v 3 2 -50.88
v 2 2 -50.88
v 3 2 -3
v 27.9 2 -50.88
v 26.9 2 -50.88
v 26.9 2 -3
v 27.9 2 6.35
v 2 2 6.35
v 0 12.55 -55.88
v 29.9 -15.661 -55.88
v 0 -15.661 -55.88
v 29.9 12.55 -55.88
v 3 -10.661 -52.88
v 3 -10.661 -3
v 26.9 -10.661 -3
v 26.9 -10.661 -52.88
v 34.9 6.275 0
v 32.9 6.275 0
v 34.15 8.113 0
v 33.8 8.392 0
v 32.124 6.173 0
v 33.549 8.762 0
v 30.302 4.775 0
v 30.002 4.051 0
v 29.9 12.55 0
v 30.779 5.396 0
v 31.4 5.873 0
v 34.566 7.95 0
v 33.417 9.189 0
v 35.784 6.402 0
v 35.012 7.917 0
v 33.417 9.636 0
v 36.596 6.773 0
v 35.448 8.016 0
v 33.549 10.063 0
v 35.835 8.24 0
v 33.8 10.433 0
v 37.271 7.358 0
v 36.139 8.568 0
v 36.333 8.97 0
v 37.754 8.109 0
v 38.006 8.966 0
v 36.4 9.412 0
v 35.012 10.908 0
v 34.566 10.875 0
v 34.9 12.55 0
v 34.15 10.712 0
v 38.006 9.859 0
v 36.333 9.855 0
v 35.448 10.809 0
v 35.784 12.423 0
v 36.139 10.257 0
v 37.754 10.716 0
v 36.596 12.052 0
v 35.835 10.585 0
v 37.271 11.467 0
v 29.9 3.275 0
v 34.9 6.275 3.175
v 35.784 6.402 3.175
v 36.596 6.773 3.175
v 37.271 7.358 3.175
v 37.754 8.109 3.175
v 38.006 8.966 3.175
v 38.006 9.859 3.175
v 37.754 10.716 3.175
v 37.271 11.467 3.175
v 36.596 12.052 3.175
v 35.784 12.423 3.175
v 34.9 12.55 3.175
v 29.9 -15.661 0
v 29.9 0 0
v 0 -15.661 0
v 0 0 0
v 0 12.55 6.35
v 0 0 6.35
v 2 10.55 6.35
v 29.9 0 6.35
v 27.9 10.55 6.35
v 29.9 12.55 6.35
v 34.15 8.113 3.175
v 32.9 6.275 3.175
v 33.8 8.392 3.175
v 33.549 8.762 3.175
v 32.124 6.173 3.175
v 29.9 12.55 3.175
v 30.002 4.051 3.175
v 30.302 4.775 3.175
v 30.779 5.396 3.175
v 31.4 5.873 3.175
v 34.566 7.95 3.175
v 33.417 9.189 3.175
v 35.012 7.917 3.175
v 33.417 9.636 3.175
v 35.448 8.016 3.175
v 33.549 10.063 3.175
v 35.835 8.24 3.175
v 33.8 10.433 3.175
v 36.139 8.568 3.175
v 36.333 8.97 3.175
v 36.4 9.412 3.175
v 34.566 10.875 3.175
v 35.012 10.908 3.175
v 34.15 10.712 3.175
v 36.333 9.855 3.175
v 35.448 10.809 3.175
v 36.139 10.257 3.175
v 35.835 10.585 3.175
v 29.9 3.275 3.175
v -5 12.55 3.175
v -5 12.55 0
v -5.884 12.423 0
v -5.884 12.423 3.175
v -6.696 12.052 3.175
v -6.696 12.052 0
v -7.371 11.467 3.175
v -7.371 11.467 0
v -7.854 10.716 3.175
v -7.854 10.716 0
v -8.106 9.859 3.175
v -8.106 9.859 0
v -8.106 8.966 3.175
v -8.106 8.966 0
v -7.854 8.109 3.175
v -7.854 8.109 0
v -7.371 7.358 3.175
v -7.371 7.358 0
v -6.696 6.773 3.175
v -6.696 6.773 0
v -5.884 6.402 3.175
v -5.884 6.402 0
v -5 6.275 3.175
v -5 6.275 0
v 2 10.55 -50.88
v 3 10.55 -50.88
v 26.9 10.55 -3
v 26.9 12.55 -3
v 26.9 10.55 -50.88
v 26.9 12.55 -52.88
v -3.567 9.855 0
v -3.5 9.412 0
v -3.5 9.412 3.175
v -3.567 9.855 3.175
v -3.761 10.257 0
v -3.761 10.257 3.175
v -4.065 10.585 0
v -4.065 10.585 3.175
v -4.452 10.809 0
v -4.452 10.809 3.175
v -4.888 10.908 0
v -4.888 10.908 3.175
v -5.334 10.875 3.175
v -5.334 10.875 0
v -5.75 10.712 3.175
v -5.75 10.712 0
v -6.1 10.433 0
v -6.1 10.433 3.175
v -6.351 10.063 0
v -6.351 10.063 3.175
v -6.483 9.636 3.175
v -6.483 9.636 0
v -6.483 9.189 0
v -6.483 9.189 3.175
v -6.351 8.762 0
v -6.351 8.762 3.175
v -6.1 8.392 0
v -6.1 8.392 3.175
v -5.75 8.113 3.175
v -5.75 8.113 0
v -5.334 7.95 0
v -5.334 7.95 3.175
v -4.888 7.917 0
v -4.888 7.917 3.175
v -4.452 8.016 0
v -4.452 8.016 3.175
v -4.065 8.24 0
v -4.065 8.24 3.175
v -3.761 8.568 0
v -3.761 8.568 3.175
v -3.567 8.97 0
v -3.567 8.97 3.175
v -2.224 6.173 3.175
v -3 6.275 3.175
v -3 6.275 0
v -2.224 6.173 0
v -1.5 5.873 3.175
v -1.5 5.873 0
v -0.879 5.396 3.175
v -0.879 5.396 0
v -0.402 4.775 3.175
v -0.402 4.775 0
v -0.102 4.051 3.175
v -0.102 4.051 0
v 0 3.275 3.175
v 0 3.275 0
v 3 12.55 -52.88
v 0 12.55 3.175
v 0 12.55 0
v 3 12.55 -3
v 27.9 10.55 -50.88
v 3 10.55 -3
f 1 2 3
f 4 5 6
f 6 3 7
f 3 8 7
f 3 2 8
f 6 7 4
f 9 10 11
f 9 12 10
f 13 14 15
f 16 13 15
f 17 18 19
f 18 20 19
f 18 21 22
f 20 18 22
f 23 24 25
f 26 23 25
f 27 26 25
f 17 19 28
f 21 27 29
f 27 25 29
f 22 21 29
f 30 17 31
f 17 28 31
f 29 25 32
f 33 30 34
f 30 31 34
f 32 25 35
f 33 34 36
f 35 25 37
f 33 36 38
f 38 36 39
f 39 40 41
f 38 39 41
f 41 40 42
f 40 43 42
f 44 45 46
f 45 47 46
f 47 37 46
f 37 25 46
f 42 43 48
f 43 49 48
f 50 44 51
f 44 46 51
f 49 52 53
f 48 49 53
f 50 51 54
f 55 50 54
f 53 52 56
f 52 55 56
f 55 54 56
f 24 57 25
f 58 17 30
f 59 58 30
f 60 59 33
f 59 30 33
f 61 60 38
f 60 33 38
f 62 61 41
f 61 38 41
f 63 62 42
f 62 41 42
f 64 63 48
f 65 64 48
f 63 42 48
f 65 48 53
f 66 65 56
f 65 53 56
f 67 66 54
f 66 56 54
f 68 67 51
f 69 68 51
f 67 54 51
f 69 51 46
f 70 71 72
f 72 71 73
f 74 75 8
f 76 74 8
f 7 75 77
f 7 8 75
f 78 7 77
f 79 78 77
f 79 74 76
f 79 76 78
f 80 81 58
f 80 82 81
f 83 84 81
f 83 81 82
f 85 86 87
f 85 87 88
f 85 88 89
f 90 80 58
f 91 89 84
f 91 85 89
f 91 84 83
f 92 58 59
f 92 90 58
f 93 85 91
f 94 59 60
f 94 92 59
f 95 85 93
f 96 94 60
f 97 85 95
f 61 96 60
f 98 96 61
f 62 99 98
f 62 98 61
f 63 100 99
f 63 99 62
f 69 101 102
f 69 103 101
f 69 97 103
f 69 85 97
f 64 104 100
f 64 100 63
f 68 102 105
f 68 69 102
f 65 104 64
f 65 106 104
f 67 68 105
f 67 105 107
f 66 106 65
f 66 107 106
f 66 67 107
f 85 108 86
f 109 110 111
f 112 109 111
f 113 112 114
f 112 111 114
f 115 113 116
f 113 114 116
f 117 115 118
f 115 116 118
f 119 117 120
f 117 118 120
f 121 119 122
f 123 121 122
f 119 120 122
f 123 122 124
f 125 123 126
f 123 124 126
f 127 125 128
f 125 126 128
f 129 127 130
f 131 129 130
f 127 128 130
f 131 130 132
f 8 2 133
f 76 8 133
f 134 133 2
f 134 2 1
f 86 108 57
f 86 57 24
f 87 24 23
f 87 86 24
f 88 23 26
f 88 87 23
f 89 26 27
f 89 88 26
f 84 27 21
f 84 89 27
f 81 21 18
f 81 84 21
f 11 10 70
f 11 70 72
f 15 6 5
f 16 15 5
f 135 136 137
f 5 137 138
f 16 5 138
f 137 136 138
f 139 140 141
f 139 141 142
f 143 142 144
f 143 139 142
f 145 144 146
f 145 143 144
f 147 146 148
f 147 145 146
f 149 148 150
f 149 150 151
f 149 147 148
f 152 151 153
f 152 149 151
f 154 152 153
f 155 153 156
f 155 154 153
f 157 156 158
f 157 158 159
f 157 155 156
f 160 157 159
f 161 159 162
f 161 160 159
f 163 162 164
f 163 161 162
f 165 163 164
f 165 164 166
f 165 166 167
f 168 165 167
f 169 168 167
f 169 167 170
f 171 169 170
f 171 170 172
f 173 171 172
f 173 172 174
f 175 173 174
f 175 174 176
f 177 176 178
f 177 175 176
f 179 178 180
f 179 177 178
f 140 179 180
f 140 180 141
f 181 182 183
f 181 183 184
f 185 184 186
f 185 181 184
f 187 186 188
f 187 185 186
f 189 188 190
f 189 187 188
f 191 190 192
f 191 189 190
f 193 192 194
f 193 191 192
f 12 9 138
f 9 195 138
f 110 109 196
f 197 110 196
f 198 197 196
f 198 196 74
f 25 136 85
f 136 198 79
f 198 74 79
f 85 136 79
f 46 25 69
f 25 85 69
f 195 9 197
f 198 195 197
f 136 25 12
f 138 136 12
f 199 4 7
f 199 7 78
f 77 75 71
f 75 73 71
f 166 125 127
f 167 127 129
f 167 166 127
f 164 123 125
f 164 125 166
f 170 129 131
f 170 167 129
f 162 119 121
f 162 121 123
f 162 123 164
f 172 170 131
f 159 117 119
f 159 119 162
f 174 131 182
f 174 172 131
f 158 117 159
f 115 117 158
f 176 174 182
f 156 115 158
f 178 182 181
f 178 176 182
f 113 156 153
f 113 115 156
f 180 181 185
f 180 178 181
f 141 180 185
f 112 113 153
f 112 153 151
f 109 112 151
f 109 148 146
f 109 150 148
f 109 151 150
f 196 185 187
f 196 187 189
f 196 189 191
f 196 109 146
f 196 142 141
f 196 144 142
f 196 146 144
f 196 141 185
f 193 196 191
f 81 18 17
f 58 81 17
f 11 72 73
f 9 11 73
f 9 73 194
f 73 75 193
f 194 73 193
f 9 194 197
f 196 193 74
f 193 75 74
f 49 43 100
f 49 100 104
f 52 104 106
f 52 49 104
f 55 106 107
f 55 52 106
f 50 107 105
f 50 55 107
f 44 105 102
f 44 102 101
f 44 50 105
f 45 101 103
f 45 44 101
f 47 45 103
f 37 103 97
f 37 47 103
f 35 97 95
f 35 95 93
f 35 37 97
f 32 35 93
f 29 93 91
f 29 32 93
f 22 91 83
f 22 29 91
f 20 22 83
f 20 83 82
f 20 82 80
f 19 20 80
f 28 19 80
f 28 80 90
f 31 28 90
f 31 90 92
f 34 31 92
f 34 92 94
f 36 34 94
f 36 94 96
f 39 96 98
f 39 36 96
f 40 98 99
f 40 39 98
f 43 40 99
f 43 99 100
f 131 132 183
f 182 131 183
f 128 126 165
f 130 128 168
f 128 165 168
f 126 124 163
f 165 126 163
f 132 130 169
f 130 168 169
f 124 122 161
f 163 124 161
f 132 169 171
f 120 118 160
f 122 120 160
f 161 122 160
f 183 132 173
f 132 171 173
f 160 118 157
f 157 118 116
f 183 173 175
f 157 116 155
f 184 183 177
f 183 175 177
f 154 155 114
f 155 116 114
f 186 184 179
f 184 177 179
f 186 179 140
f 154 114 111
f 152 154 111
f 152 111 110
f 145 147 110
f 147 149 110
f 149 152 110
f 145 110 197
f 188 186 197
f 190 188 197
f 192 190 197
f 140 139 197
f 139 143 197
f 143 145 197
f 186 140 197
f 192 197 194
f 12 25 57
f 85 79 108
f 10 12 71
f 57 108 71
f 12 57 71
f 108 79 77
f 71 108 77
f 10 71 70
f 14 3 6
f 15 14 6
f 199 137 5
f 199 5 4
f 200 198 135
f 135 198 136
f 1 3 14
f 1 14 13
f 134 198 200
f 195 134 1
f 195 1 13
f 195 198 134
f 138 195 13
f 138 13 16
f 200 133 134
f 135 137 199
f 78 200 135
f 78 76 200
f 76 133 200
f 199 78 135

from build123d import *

# Parameters (mm, degrees)
SKETCH1_W           = 29.9
SKETCH1_H           = 12.55
SKETCH1_R           = 1.5
BOSS_EXTRUDE1_DEPTH = 3.175
SKETCH2_W           = 29.9
SKETCH2_H           = 12.55
BOSS_EXTRUDE2_DEPTH = 3.175
BOSS_EXTRUDE3_DEPTH = 55.88
BOSS_EXTRUDE4_DEPTH = 3.175
SKETCH6_W           = 25.9
SKETCH6_H           = 8.55
CUT_EXTRUDE1_DEPTH  = 57.23
SKETCH7_W           = 23.9
SKETCH7_H           = 49.88
CUT_EXTRUDE2_DEPTH  = 23.211


with BuildPart() as part:
    # Sketch1 → Boss-Extrude1 (new body)
    # profile 1 of 3: a face of its own
    with BuildSketch(Plane.XY):
        with Locations((14.95, 6.275)):
            Rectangle(SKETCH1_W, SKETCH1_H)
    # profile 2 of 3: a face of its own
    with BuildSketch(Plane.XY):
        with BuildLine():
            Line((-5, 6.275), (0, 6.275))
            Line((0, 6.275), (0, 12.55))
            Line((0, 12.55), (-5, 12.55))
            ThreePointArc((-5, 12.55), (-8.1375, 9.4125), (-5, 6.275))
        make_face()
        with Locations((-5, 9.4125)):
            Circle(SKETCH1_R, mode=Mode.SUBTRACT)
    # profile 3 of 3: a face of its own
    with BuildSketch(Plane.XY):
        with BuildLine():
            Line((29.9, 12.55), (29.9, 6.275))
            Line((29.9, 6.275), (34.9, 6.275))
            ThreePointArc((34.9, 6.275), (38.0375, 9.4125), (34.9, 12.55))
            Line((34.9, 12.55), (29.9, 12.55))
        make_face()
        with Locations((34.9, 9.4125)):
            Circle(SKETCH1_R, mode=Mode.SUBTRACT)
    extrude(amount=BOSS_EXTRUDE1_DEPTH)

    # Sketch2 → Boss-Extrude2 (add)
    with BuildSketch(Plane.XY.offset(3.175)):
        with Locations((14.95, 6.275)):
            Rectangle(SKETCH2_W, SKETCH2_H)
    extrude(amount=BOSS_EXTRUDE2_DEPTH)

    # Sketch3 → Boss-Extrude3 (add)
    with BuildSketch(Plane(origin=(0, 0, 0), x_dir=(-1, 0, 0), z_dir=(0, 0, -1))):
        Polygon((-29.9, 0), (-29.9, -15.661), (0, -15.661), (0, 12.55), (-29.9, 12.55), align=None)
    extrude(amount=BOSS_EXTRUDE3_DEPTH)

    # Sketch5 → Boss-Extrude4 (add)
    with BuildSketch(Plane.XY.offset(3.175)):
        with BuildLine():
            Line((32.9, 6.275), (29.9, 6.275))
            Line((29.9, 6.275), (29.9, 3.275))
            ThreePointArc((29.9, 3.275), (30.778679656, 5.396320344), (32.9, 6.275))
        make_face()
        with BuildLine():
            Line((0, 6.275), (-3, 6.275))
            ThreePointArc((-3, 6.275), (-0.878679656, 5.396320344), (0, 3.275))
            Line((0, 3.275), (0, 6.275))
        make_face()
    extrude(amount=-BOSS_EXTRUDE4_DEPTH)

    # Sketch6 → Cut-Extrude1 (cut)
    with BuildSketch(Plane.XY.offset(6.35)):
        with Locations((14.95, 6.275)):
            Rectangle(SKETCH6_W, SKETCH6_H)
    extrude(amount=-CUT_EXTRUDE1_DEPTH, mode=Mode.SUBTRACT)

    # Sketch7 → Cut-Extrude2 (cut)
    with BuildSketch(Plane(origin=(0, 12.55, 0), x_dir=(1, 0, 0), z_dir=(0, 1, 0))):
        with Locations((14.95, 27.94)):
            Rectangle(SKETCH7_W, SKETCH7_H)
    extrude(amount=-CUT_EXTRUDE2_DEPTH, mode=Mode.SUBTRACT)


solid = part.part
